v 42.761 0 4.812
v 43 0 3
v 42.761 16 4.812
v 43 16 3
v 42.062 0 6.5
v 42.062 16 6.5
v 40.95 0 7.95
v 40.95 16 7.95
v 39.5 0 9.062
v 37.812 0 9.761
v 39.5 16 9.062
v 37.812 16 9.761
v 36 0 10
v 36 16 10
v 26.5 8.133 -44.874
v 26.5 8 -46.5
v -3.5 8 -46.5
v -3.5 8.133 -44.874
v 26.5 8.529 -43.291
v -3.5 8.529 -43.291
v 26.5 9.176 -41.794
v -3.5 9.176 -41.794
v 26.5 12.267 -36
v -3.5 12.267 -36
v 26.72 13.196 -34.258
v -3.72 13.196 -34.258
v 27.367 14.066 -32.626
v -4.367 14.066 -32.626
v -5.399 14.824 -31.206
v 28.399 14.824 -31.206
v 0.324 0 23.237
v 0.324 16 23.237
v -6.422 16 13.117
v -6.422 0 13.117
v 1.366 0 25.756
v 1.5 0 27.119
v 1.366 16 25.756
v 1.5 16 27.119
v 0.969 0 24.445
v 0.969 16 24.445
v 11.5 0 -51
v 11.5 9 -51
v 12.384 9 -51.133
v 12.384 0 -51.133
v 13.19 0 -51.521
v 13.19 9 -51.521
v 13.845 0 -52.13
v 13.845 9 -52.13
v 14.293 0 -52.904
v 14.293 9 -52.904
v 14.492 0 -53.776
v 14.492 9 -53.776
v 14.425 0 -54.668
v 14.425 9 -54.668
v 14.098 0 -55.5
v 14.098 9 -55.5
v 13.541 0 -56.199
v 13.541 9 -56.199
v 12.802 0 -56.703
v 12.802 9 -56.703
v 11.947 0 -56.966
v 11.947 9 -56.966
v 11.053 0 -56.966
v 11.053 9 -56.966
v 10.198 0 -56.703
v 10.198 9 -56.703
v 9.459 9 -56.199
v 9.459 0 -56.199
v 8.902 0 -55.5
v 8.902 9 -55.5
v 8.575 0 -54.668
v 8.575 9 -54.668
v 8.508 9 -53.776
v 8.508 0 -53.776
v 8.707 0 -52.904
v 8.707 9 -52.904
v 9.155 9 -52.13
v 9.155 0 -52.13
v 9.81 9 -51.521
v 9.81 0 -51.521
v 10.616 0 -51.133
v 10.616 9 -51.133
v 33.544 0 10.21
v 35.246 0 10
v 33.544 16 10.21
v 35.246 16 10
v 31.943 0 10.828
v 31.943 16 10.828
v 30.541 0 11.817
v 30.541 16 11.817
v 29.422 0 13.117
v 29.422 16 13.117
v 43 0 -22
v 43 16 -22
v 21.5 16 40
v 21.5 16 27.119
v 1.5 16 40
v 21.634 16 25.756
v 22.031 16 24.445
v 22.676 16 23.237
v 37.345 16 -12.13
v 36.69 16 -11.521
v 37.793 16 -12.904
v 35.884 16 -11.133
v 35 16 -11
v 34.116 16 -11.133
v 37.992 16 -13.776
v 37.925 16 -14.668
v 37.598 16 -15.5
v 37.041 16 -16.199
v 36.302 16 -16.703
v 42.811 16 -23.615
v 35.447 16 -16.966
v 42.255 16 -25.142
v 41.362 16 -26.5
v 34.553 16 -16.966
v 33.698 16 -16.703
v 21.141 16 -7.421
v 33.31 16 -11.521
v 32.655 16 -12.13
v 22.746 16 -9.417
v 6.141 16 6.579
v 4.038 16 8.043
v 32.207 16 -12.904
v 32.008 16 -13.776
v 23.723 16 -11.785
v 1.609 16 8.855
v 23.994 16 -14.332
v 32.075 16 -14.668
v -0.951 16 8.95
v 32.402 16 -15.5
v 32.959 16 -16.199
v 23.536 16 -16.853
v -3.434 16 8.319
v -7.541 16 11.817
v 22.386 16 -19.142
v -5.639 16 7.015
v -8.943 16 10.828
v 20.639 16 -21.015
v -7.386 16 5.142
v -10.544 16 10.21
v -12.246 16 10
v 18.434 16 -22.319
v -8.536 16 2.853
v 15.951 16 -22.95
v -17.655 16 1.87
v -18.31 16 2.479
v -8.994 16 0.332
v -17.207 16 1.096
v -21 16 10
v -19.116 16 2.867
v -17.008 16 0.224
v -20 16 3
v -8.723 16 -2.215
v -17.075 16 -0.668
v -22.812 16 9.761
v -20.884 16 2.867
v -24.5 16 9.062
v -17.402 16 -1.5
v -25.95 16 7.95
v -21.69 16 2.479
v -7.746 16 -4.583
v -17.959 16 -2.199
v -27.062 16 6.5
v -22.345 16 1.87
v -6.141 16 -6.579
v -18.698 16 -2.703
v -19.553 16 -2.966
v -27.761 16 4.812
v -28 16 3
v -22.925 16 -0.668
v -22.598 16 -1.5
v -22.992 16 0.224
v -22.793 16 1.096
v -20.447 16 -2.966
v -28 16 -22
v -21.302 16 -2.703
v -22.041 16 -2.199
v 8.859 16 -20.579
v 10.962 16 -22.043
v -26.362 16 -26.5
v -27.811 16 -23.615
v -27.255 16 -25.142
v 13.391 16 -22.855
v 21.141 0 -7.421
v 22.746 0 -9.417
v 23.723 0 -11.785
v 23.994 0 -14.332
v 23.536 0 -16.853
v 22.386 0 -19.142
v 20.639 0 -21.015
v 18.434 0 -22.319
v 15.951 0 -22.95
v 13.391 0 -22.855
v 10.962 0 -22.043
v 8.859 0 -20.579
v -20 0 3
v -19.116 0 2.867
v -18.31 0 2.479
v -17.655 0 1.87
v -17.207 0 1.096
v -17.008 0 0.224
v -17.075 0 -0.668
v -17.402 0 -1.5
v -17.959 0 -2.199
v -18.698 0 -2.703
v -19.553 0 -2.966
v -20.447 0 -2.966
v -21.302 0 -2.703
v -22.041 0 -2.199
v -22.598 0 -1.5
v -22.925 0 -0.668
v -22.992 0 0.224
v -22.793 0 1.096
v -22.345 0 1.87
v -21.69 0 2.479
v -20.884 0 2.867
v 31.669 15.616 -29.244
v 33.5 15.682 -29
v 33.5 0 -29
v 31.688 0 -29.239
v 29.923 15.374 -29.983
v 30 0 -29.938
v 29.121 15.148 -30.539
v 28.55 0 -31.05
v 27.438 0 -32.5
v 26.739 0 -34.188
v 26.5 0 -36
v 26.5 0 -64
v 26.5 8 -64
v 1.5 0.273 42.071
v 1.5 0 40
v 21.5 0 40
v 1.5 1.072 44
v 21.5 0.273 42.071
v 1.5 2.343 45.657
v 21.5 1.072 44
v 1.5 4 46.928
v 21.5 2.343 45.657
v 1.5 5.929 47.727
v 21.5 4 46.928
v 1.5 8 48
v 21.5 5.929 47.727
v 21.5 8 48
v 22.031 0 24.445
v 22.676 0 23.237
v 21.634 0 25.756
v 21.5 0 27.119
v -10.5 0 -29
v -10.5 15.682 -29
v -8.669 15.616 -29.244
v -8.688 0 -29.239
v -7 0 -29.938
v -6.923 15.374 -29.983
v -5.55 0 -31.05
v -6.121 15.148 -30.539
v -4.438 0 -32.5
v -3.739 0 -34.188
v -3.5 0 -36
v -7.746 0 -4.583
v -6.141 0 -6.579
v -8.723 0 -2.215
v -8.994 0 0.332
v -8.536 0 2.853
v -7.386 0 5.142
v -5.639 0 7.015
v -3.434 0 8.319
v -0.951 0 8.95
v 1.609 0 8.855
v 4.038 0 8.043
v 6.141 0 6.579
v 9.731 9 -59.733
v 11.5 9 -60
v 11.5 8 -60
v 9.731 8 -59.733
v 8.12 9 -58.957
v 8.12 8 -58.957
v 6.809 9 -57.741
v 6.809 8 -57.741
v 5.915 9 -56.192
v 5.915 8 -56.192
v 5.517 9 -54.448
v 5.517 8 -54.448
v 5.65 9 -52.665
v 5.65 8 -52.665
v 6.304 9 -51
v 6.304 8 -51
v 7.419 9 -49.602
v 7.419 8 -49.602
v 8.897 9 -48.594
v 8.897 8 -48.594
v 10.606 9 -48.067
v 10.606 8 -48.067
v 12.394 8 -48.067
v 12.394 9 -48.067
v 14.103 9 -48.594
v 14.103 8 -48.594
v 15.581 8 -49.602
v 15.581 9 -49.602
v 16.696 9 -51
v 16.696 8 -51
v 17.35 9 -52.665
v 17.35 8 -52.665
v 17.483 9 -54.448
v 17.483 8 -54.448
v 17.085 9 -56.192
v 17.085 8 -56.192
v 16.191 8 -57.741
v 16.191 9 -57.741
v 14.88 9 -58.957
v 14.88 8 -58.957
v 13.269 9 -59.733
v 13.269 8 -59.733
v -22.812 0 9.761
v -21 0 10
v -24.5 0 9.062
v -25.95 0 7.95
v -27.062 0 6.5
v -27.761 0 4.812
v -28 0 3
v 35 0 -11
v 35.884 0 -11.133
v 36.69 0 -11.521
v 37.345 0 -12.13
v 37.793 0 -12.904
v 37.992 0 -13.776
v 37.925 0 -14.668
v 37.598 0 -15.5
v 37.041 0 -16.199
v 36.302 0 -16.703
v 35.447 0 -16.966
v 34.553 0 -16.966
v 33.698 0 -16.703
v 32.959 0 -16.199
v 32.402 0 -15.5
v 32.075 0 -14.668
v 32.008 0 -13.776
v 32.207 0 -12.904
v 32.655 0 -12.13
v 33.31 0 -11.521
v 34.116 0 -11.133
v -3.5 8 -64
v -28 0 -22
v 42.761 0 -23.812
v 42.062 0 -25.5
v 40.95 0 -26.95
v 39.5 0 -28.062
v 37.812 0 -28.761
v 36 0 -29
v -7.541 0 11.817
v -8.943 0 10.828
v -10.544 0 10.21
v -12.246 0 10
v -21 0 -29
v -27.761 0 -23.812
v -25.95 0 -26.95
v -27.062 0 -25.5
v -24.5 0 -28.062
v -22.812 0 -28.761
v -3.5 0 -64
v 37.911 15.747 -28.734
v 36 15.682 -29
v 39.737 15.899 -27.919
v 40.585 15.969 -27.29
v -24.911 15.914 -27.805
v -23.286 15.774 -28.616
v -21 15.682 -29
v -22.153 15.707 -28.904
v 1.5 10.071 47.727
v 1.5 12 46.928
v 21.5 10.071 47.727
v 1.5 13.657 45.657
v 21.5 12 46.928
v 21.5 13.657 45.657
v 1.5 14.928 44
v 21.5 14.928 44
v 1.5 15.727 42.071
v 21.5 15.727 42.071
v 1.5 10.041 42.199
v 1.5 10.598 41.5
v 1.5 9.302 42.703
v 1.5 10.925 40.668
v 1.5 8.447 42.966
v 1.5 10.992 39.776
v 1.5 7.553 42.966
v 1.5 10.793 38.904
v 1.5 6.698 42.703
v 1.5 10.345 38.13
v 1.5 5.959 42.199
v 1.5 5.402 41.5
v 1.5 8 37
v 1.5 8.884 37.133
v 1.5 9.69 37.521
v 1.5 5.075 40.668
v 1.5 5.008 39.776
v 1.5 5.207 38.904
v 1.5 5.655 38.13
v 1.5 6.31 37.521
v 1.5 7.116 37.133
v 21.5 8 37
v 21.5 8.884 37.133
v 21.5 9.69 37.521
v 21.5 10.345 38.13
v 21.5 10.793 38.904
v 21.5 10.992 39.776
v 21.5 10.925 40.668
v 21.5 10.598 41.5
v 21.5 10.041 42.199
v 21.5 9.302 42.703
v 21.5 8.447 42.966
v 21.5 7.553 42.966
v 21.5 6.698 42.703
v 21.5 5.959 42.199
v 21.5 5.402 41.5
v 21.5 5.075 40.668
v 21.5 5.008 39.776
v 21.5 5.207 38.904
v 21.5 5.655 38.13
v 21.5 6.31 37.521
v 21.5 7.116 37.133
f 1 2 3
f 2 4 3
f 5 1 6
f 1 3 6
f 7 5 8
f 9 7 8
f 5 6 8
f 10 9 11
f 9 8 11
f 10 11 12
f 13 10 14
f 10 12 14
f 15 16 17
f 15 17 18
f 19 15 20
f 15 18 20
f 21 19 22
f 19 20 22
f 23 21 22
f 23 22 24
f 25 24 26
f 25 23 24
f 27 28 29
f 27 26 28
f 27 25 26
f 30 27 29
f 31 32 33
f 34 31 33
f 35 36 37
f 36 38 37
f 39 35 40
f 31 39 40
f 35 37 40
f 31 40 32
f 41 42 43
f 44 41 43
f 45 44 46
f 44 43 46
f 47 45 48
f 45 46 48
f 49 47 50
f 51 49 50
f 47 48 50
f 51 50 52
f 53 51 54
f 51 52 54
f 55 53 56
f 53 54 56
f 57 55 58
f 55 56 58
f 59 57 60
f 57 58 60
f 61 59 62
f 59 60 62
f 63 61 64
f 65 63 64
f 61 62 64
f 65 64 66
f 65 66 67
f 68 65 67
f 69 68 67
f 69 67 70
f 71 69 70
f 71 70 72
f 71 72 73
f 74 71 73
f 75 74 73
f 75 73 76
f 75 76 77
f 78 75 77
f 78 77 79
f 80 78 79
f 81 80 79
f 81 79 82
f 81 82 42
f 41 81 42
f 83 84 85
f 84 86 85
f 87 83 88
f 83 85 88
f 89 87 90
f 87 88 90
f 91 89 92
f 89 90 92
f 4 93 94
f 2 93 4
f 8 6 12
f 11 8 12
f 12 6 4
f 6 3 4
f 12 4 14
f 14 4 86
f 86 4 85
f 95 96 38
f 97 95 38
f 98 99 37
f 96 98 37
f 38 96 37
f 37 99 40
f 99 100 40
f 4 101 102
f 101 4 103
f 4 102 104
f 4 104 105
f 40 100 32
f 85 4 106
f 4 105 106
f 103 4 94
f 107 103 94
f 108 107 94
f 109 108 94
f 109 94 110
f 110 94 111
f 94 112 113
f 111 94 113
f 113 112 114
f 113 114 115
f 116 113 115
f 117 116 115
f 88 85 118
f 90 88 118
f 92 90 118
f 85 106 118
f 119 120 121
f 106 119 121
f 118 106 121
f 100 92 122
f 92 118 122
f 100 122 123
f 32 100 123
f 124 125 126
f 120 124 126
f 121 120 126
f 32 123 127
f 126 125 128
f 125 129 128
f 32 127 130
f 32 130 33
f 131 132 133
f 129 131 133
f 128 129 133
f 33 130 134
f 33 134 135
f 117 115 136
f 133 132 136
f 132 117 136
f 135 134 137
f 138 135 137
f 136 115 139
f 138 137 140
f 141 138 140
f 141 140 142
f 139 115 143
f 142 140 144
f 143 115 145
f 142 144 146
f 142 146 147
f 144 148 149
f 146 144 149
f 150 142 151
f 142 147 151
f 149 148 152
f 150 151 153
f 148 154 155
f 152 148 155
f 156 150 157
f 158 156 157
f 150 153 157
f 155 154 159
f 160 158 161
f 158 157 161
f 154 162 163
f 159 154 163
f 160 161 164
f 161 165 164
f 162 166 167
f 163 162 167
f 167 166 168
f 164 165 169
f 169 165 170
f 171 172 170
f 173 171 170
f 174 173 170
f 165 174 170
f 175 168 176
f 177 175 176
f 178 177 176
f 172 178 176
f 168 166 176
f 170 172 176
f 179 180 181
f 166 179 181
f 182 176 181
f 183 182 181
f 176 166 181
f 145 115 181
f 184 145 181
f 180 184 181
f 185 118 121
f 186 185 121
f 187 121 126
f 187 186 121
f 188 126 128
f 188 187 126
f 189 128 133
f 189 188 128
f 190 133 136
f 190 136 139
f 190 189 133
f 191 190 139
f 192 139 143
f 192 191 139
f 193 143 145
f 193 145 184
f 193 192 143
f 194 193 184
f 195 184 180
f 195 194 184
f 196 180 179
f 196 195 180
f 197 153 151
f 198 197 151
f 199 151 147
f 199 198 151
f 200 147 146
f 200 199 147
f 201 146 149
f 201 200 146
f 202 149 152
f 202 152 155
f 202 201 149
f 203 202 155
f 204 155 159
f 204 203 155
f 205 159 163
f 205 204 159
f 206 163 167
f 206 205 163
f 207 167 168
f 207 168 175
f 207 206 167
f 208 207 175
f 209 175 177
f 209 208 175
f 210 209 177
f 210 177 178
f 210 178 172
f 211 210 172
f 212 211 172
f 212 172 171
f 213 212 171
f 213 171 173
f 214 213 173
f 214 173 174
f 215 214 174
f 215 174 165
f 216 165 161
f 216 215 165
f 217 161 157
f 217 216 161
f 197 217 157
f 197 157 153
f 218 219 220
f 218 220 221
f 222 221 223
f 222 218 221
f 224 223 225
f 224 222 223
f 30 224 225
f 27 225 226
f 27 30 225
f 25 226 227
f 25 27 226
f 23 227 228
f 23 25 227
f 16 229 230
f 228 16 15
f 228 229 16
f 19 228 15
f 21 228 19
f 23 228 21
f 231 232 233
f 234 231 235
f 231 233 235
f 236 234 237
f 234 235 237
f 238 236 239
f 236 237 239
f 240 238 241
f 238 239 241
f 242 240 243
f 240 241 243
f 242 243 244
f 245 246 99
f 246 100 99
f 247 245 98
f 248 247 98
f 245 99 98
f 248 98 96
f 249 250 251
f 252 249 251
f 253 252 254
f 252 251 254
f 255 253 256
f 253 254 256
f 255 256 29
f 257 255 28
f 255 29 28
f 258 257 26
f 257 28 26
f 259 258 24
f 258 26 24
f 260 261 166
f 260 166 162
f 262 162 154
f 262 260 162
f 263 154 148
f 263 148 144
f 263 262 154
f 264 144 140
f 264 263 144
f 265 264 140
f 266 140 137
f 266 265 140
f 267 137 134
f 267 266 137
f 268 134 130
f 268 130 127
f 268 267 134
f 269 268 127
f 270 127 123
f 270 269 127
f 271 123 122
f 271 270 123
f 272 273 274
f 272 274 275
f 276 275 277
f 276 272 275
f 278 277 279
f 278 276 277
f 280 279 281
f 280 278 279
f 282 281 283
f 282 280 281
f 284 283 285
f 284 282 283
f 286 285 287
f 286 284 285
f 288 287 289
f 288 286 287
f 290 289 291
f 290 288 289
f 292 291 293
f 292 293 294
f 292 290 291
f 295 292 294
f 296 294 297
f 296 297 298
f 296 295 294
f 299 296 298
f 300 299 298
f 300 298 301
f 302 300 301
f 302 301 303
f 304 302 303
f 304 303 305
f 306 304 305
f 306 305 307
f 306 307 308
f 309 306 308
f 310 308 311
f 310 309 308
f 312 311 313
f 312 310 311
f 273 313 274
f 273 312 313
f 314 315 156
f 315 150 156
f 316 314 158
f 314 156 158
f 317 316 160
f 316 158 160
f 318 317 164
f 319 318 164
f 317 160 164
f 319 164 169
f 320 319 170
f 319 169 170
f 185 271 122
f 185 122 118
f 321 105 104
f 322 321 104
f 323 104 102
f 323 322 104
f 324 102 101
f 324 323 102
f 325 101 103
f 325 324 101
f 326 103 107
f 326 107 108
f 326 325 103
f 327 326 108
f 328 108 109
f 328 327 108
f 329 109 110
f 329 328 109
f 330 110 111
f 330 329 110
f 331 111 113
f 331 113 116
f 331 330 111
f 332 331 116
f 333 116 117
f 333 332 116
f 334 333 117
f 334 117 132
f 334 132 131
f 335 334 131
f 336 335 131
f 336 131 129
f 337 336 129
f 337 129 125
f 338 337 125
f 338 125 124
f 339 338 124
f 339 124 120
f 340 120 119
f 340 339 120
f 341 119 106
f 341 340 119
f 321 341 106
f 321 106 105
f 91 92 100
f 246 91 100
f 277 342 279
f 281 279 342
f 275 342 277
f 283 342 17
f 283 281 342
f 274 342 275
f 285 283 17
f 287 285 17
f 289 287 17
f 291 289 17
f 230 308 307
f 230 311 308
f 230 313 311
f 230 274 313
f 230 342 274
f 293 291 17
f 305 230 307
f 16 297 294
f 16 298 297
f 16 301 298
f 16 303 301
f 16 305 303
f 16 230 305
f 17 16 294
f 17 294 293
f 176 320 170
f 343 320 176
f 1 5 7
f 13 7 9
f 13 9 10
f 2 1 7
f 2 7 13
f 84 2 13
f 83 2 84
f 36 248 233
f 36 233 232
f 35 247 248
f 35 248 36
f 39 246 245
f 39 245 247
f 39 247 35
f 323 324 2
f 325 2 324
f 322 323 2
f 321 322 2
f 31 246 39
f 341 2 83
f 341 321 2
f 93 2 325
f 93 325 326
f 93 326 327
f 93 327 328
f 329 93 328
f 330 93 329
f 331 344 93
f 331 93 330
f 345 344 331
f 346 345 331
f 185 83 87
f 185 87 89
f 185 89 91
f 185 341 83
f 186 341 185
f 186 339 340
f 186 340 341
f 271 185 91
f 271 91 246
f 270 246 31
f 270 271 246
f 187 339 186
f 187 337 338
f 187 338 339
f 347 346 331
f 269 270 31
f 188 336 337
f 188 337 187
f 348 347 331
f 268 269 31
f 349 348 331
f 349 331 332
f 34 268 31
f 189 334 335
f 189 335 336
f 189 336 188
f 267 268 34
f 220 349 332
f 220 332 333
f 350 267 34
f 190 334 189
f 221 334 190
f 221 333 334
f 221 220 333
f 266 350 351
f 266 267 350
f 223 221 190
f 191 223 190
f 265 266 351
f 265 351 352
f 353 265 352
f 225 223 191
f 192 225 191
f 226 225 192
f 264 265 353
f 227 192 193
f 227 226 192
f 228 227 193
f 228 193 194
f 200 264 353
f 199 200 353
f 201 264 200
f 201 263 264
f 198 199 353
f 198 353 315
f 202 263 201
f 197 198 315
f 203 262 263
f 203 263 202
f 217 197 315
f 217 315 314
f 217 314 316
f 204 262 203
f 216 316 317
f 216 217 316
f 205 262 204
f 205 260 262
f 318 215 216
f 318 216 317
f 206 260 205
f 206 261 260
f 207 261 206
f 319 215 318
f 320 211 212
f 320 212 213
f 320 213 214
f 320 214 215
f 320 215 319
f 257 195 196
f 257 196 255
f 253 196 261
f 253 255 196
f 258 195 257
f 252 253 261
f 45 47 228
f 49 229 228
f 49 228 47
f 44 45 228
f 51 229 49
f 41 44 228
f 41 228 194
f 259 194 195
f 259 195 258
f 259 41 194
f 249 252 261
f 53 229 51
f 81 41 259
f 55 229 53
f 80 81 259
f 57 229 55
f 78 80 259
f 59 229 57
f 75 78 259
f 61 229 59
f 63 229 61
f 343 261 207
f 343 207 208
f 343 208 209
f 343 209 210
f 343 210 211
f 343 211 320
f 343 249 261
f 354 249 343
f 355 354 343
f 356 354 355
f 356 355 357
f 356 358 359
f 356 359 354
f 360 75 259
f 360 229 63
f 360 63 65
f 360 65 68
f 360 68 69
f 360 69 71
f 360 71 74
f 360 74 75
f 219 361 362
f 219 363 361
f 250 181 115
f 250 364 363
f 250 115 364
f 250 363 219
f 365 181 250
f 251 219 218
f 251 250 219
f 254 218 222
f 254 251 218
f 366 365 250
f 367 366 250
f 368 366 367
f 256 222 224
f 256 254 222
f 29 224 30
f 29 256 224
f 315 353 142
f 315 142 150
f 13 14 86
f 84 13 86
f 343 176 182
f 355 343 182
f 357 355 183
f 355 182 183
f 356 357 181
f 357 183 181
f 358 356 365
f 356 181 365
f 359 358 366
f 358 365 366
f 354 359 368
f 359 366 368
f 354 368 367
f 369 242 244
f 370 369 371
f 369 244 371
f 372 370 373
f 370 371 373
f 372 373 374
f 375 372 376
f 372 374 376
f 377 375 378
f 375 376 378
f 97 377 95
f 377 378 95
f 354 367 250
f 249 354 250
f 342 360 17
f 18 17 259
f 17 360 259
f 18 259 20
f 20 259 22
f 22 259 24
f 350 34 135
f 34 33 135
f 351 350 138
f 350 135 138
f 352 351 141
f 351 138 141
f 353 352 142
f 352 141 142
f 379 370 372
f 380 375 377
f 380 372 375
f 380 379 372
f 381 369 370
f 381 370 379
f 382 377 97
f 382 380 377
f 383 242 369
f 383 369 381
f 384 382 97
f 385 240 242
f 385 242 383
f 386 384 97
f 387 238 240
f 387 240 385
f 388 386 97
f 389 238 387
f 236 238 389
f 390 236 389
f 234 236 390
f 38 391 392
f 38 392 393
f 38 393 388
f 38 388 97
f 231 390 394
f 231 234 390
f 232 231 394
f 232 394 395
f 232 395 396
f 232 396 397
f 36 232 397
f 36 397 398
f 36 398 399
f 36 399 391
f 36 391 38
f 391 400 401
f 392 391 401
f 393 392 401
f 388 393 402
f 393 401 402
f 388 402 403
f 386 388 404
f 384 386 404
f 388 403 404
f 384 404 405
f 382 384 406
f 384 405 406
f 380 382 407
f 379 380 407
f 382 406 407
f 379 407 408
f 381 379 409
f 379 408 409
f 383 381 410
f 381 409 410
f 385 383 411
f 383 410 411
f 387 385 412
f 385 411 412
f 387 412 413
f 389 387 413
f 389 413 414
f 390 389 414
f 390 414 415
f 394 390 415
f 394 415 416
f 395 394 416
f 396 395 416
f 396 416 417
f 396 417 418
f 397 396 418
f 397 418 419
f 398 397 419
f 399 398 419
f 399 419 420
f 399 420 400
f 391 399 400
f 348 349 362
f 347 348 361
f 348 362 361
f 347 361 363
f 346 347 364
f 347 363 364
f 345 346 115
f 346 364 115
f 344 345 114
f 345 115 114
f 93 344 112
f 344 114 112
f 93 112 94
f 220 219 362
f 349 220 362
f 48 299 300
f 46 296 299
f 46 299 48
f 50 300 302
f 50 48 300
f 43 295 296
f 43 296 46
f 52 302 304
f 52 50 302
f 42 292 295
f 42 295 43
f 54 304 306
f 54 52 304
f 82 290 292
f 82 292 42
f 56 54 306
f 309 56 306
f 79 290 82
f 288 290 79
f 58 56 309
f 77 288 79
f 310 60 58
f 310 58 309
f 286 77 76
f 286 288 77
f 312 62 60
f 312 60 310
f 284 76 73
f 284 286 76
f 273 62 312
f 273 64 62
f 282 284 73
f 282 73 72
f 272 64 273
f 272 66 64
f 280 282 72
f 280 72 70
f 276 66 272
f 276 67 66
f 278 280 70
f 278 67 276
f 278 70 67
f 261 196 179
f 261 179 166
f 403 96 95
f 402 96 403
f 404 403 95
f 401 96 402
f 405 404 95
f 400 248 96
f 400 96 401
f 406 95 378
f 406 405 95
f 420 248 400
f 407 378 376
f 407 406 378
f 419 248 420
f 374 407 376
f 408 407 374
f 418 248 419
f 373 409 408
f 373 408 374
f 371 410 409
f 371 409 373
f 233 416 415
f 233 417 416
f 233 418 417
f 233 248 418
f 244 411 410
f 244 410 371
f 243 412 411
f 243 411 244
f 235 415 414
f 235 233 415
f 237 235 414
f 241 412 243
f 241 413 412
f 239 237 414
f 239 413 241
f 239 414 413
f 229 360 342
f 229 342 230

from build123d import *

# Parameters (mm, degrees)
SKETCH_1_R          = 3
EXTRUDE_1_DEPTH     = 16
CUT_EXTRUDE_1_REACH = 84.476
SKETCH_2_R          = 3
CUT_EXTRUDE_2_REACH = 84.476
CUT_EXTRUDE_3_DEPTH = 30
SKETCH_5_R          = 3
CUT_EXTRUDE_4_DEPTH = 78.517739905
EXTRUDE_START       = 1
SKETCH_6_R          = 6
SKETCH_6_R_2        = 3
EXTRUDE_2_DEPTH     = 1
FILLET_1_R          = 7
FILLET_START        = -27
FILLET_3_DEPTH      = 69
FILLET_START_2      = -3.5
FILLET_3_2_DEPTH    = 30


with BuildPart() as part:
    # 草图1 → 凸台-拉伸1 (new body)
    with BuildSketch(Plane(origin=(0, 0, 0), x_dir=(1, 0, 0), z_dir=(0, 1, 0))):
        Polygon((-3.5, 64), (26.5, 64), (26.5, 29), (43, 29), (43, -10), (31.5, -10), (21.5, -25), (21.5, -48), (1.5, -48), (1.5, -25), (-8.5, -10), (-28, -10), (-28, 29), (-3.5, 29), align=None)
        with Locations(Location((-20, 0, 0), (0, 0, 270))):
            Circle(SKETCH_1_R, mode=Mode.SUBTRACT)
        with Locations(Location((35, 14, 0), (0, 0, 270))):
            Circle(SKETCH_1_R, mode=Mode.SUBTRACT)
        with BuildLine():
            Line((6.140864253, -6.579497414), (21.140864253, 7.420502586))
            ThreePointArc((21.140864253, 7.420502586), (21.579497414, 20.140864253), (8.859135747, 20.579497414))
            Line((8.859135747, 20.579497414), (-6.140864253, 6.579497414))
            ThreePointArc((-6.140864253, 6.579497414), (-6.579497414, -6.140864253), (6.140864253, -6.579497414))
        make_face(mode=Mode.SUBTRACT)
    extrude(amount=EXTRUDE_1_DEPTH)

    # 草图2 → 切除-拉伸1 (cut, up to next)
    with BuildSketch(Plane(origin=(21.5, 0, 0), x_dir=(0, 0, -1), z_dir=(1, 0, 0)), mode=Mode.PRIVATE) as cut_extrude_1_sk1:
        with Locations((-40, 8)):
            Circle(SKETCH_2_R)
    cut_extrude_1_tool1 = extrude(cut_extrude_1_sk1.sketch, amount=-CUT_EXTRUDE_1_REACH, mode=Mode.PRIVATE) & part.part
    add(cut_extrude_1_tool1.solids().sort_by_distance((21.5, 8, 40))[0], mode=Mode.SUBTRACT)

    # 草图3 → 切除-拉伸2 (cut, up to next)
    with BuildSketch(Plane(origin=(21.5, 0, 0), x_dir=(0, 0, -1), z_dir=(1, 0, 0)), mode=Mode.PRIVATE) as cut_extrude_2_sk1:
        with BuildLine():
            ThreePointArc((-48, 8), (-45.656854249, 13.656854249), (-40, 16))
            Line((-40, 16), (-48, 16))
            Line((-48, 16), (-48, 8))
        make_face()
    cut_extrude_2_tool1 = extrude(cut_extrude_2_sk1.sketch, amount=-CUT_EXTRUDE_2_REACH, mode=Mode.PRIVATE) & part.part
    # 草图3 → 切除-拉伸2 (cut, up to next)
    with BuildSketch(Plane(origin=(21.5, 0, 0), x_dir=(0, 0, -1), z_dir=(1, 0, 0)), mode=Mode.PRIVATE) as cut_extrude_2_sk2:
        with BuildLine():
            Line((-48, 0), (-40, 0))
            ThreePointArc((-40, 0), (-45.656854249, 2.343145751), (-48, 8))
            Line((-48, 8), (-48, 0))
        make_face()
    cut_extrude_2_tool2 = extrude(cut_extrude_2_sk2.sketch, amount=-CUT_EXTRUDE_2_REACH, mode=Mode.PRIVATE) & part.part
    add(cut_extrude_2_tool1.solids().sort_by_distance((21.5, 14.213056, 46.213056))[0], mode=Mode.SUBTRACT)
    add(cut_extrude_2_tool2.solids().sort_by_distance((21.5, 1.786944, 46.213056))[0], mode=Mode.SUBTRACT)

    # 草图4 → 切除-拉伸3 (cut)
    with BuildSketch(Plane(origin=(26.5, 0, 0), x_dir=(0, 0, -1), z_dir=(1, 0, 0))):
        Polygon((29, 16), (64, 16), (64, 8), (44, 8), align=None)
    extrude(amount=-CUT_EXTRUDE_3_DEPTH, mode=Mode.SUBTRACT)

    # 草图5 → 切除-拉伸4 (cut, through all)
    with BuildSketch(Plane(origin=(0, 8, 0), x_dir=(1, 0, 0), z_dir=(0, 1, 0))):
        with Locations(Location((11.5, 54, 0), (0, 0, 270))):
            Circle(SKETCH_5_R)
    extrude(amount=-CUT_EXTRUDE_4_DEPTH, mode=Mode.SUBTRACT)

    # 草图6 → 凸台-拉伸2 (add)
    with BuildSketch(Plane(origin=(0, 8, 0), x_dir=(1, 0, 0), z_dir=(0, 1, 0)).offset(EXTRUDE_START)):
        with Locations(Location((11.5, 54, 0), (0, 0, 90))):
            Circle(SKETCH_6_R)
        with Locations(Location((11.5, 54, 0), (0, 0, 270))):
            Circle(SKETCH_6_R_2, mode=Mode.SUBTRACT)
    extrude(amount=-EXTRUDE_2_DEPTH)

    # 圆角1
    fillet_1_edges = [part.edges().sort_by_distance(p)[0] for p in [
        (1.5, 8, 25),
        (-8.5, 8, 10),
        (-28, 8, 10),
        (-28, 8, -29),
        (-3.5, 8, -29),
        (26.5, 8, -29),
        (43, 8, -29),
        (43, 8, 10),
        (31.5, 8, 10),
        (21.5, 8, 25),
    ]]
    fillet(fillet_1_edges, radius=FILLET_1_R)

    # 圆角3: read off the stored shape, not the designer's step
    # 圆角3 outline → 圆角3 (cut)
    with BuildSketch(Plane.YZ.offset(FILLET_START)):
        with BuildLine():
            Line((14.823529412, -31.205882353), (16, -29))
            Line((16, -29), (16, -26.5))
            ThreePointArc((16, -26.5), (15.701425001, -28.92535625), (14.823529412, -31.205882353))
        make_face()
    extrude(amount=FILLET_3_DEPTH, mode=Mode.SUBTRACT)

    # Fillet 3 2 outline → Fillet 3 2 (add)
    with BuildSketch(Plane.YZ.offset(FILLET_START_2)):
        with BuildLine():
            Line((8, -44), (8, -46.5))
            ThreePointArc((8, -46.5), (8.298574999, -44.07464375), (9.176470588, -41.794117647))
            Line((9.176470588, -41.794117647), (8, -44))
        make_face()
    extrude(amount=FILLET_3_2_DEPTH)


solid = part.part
